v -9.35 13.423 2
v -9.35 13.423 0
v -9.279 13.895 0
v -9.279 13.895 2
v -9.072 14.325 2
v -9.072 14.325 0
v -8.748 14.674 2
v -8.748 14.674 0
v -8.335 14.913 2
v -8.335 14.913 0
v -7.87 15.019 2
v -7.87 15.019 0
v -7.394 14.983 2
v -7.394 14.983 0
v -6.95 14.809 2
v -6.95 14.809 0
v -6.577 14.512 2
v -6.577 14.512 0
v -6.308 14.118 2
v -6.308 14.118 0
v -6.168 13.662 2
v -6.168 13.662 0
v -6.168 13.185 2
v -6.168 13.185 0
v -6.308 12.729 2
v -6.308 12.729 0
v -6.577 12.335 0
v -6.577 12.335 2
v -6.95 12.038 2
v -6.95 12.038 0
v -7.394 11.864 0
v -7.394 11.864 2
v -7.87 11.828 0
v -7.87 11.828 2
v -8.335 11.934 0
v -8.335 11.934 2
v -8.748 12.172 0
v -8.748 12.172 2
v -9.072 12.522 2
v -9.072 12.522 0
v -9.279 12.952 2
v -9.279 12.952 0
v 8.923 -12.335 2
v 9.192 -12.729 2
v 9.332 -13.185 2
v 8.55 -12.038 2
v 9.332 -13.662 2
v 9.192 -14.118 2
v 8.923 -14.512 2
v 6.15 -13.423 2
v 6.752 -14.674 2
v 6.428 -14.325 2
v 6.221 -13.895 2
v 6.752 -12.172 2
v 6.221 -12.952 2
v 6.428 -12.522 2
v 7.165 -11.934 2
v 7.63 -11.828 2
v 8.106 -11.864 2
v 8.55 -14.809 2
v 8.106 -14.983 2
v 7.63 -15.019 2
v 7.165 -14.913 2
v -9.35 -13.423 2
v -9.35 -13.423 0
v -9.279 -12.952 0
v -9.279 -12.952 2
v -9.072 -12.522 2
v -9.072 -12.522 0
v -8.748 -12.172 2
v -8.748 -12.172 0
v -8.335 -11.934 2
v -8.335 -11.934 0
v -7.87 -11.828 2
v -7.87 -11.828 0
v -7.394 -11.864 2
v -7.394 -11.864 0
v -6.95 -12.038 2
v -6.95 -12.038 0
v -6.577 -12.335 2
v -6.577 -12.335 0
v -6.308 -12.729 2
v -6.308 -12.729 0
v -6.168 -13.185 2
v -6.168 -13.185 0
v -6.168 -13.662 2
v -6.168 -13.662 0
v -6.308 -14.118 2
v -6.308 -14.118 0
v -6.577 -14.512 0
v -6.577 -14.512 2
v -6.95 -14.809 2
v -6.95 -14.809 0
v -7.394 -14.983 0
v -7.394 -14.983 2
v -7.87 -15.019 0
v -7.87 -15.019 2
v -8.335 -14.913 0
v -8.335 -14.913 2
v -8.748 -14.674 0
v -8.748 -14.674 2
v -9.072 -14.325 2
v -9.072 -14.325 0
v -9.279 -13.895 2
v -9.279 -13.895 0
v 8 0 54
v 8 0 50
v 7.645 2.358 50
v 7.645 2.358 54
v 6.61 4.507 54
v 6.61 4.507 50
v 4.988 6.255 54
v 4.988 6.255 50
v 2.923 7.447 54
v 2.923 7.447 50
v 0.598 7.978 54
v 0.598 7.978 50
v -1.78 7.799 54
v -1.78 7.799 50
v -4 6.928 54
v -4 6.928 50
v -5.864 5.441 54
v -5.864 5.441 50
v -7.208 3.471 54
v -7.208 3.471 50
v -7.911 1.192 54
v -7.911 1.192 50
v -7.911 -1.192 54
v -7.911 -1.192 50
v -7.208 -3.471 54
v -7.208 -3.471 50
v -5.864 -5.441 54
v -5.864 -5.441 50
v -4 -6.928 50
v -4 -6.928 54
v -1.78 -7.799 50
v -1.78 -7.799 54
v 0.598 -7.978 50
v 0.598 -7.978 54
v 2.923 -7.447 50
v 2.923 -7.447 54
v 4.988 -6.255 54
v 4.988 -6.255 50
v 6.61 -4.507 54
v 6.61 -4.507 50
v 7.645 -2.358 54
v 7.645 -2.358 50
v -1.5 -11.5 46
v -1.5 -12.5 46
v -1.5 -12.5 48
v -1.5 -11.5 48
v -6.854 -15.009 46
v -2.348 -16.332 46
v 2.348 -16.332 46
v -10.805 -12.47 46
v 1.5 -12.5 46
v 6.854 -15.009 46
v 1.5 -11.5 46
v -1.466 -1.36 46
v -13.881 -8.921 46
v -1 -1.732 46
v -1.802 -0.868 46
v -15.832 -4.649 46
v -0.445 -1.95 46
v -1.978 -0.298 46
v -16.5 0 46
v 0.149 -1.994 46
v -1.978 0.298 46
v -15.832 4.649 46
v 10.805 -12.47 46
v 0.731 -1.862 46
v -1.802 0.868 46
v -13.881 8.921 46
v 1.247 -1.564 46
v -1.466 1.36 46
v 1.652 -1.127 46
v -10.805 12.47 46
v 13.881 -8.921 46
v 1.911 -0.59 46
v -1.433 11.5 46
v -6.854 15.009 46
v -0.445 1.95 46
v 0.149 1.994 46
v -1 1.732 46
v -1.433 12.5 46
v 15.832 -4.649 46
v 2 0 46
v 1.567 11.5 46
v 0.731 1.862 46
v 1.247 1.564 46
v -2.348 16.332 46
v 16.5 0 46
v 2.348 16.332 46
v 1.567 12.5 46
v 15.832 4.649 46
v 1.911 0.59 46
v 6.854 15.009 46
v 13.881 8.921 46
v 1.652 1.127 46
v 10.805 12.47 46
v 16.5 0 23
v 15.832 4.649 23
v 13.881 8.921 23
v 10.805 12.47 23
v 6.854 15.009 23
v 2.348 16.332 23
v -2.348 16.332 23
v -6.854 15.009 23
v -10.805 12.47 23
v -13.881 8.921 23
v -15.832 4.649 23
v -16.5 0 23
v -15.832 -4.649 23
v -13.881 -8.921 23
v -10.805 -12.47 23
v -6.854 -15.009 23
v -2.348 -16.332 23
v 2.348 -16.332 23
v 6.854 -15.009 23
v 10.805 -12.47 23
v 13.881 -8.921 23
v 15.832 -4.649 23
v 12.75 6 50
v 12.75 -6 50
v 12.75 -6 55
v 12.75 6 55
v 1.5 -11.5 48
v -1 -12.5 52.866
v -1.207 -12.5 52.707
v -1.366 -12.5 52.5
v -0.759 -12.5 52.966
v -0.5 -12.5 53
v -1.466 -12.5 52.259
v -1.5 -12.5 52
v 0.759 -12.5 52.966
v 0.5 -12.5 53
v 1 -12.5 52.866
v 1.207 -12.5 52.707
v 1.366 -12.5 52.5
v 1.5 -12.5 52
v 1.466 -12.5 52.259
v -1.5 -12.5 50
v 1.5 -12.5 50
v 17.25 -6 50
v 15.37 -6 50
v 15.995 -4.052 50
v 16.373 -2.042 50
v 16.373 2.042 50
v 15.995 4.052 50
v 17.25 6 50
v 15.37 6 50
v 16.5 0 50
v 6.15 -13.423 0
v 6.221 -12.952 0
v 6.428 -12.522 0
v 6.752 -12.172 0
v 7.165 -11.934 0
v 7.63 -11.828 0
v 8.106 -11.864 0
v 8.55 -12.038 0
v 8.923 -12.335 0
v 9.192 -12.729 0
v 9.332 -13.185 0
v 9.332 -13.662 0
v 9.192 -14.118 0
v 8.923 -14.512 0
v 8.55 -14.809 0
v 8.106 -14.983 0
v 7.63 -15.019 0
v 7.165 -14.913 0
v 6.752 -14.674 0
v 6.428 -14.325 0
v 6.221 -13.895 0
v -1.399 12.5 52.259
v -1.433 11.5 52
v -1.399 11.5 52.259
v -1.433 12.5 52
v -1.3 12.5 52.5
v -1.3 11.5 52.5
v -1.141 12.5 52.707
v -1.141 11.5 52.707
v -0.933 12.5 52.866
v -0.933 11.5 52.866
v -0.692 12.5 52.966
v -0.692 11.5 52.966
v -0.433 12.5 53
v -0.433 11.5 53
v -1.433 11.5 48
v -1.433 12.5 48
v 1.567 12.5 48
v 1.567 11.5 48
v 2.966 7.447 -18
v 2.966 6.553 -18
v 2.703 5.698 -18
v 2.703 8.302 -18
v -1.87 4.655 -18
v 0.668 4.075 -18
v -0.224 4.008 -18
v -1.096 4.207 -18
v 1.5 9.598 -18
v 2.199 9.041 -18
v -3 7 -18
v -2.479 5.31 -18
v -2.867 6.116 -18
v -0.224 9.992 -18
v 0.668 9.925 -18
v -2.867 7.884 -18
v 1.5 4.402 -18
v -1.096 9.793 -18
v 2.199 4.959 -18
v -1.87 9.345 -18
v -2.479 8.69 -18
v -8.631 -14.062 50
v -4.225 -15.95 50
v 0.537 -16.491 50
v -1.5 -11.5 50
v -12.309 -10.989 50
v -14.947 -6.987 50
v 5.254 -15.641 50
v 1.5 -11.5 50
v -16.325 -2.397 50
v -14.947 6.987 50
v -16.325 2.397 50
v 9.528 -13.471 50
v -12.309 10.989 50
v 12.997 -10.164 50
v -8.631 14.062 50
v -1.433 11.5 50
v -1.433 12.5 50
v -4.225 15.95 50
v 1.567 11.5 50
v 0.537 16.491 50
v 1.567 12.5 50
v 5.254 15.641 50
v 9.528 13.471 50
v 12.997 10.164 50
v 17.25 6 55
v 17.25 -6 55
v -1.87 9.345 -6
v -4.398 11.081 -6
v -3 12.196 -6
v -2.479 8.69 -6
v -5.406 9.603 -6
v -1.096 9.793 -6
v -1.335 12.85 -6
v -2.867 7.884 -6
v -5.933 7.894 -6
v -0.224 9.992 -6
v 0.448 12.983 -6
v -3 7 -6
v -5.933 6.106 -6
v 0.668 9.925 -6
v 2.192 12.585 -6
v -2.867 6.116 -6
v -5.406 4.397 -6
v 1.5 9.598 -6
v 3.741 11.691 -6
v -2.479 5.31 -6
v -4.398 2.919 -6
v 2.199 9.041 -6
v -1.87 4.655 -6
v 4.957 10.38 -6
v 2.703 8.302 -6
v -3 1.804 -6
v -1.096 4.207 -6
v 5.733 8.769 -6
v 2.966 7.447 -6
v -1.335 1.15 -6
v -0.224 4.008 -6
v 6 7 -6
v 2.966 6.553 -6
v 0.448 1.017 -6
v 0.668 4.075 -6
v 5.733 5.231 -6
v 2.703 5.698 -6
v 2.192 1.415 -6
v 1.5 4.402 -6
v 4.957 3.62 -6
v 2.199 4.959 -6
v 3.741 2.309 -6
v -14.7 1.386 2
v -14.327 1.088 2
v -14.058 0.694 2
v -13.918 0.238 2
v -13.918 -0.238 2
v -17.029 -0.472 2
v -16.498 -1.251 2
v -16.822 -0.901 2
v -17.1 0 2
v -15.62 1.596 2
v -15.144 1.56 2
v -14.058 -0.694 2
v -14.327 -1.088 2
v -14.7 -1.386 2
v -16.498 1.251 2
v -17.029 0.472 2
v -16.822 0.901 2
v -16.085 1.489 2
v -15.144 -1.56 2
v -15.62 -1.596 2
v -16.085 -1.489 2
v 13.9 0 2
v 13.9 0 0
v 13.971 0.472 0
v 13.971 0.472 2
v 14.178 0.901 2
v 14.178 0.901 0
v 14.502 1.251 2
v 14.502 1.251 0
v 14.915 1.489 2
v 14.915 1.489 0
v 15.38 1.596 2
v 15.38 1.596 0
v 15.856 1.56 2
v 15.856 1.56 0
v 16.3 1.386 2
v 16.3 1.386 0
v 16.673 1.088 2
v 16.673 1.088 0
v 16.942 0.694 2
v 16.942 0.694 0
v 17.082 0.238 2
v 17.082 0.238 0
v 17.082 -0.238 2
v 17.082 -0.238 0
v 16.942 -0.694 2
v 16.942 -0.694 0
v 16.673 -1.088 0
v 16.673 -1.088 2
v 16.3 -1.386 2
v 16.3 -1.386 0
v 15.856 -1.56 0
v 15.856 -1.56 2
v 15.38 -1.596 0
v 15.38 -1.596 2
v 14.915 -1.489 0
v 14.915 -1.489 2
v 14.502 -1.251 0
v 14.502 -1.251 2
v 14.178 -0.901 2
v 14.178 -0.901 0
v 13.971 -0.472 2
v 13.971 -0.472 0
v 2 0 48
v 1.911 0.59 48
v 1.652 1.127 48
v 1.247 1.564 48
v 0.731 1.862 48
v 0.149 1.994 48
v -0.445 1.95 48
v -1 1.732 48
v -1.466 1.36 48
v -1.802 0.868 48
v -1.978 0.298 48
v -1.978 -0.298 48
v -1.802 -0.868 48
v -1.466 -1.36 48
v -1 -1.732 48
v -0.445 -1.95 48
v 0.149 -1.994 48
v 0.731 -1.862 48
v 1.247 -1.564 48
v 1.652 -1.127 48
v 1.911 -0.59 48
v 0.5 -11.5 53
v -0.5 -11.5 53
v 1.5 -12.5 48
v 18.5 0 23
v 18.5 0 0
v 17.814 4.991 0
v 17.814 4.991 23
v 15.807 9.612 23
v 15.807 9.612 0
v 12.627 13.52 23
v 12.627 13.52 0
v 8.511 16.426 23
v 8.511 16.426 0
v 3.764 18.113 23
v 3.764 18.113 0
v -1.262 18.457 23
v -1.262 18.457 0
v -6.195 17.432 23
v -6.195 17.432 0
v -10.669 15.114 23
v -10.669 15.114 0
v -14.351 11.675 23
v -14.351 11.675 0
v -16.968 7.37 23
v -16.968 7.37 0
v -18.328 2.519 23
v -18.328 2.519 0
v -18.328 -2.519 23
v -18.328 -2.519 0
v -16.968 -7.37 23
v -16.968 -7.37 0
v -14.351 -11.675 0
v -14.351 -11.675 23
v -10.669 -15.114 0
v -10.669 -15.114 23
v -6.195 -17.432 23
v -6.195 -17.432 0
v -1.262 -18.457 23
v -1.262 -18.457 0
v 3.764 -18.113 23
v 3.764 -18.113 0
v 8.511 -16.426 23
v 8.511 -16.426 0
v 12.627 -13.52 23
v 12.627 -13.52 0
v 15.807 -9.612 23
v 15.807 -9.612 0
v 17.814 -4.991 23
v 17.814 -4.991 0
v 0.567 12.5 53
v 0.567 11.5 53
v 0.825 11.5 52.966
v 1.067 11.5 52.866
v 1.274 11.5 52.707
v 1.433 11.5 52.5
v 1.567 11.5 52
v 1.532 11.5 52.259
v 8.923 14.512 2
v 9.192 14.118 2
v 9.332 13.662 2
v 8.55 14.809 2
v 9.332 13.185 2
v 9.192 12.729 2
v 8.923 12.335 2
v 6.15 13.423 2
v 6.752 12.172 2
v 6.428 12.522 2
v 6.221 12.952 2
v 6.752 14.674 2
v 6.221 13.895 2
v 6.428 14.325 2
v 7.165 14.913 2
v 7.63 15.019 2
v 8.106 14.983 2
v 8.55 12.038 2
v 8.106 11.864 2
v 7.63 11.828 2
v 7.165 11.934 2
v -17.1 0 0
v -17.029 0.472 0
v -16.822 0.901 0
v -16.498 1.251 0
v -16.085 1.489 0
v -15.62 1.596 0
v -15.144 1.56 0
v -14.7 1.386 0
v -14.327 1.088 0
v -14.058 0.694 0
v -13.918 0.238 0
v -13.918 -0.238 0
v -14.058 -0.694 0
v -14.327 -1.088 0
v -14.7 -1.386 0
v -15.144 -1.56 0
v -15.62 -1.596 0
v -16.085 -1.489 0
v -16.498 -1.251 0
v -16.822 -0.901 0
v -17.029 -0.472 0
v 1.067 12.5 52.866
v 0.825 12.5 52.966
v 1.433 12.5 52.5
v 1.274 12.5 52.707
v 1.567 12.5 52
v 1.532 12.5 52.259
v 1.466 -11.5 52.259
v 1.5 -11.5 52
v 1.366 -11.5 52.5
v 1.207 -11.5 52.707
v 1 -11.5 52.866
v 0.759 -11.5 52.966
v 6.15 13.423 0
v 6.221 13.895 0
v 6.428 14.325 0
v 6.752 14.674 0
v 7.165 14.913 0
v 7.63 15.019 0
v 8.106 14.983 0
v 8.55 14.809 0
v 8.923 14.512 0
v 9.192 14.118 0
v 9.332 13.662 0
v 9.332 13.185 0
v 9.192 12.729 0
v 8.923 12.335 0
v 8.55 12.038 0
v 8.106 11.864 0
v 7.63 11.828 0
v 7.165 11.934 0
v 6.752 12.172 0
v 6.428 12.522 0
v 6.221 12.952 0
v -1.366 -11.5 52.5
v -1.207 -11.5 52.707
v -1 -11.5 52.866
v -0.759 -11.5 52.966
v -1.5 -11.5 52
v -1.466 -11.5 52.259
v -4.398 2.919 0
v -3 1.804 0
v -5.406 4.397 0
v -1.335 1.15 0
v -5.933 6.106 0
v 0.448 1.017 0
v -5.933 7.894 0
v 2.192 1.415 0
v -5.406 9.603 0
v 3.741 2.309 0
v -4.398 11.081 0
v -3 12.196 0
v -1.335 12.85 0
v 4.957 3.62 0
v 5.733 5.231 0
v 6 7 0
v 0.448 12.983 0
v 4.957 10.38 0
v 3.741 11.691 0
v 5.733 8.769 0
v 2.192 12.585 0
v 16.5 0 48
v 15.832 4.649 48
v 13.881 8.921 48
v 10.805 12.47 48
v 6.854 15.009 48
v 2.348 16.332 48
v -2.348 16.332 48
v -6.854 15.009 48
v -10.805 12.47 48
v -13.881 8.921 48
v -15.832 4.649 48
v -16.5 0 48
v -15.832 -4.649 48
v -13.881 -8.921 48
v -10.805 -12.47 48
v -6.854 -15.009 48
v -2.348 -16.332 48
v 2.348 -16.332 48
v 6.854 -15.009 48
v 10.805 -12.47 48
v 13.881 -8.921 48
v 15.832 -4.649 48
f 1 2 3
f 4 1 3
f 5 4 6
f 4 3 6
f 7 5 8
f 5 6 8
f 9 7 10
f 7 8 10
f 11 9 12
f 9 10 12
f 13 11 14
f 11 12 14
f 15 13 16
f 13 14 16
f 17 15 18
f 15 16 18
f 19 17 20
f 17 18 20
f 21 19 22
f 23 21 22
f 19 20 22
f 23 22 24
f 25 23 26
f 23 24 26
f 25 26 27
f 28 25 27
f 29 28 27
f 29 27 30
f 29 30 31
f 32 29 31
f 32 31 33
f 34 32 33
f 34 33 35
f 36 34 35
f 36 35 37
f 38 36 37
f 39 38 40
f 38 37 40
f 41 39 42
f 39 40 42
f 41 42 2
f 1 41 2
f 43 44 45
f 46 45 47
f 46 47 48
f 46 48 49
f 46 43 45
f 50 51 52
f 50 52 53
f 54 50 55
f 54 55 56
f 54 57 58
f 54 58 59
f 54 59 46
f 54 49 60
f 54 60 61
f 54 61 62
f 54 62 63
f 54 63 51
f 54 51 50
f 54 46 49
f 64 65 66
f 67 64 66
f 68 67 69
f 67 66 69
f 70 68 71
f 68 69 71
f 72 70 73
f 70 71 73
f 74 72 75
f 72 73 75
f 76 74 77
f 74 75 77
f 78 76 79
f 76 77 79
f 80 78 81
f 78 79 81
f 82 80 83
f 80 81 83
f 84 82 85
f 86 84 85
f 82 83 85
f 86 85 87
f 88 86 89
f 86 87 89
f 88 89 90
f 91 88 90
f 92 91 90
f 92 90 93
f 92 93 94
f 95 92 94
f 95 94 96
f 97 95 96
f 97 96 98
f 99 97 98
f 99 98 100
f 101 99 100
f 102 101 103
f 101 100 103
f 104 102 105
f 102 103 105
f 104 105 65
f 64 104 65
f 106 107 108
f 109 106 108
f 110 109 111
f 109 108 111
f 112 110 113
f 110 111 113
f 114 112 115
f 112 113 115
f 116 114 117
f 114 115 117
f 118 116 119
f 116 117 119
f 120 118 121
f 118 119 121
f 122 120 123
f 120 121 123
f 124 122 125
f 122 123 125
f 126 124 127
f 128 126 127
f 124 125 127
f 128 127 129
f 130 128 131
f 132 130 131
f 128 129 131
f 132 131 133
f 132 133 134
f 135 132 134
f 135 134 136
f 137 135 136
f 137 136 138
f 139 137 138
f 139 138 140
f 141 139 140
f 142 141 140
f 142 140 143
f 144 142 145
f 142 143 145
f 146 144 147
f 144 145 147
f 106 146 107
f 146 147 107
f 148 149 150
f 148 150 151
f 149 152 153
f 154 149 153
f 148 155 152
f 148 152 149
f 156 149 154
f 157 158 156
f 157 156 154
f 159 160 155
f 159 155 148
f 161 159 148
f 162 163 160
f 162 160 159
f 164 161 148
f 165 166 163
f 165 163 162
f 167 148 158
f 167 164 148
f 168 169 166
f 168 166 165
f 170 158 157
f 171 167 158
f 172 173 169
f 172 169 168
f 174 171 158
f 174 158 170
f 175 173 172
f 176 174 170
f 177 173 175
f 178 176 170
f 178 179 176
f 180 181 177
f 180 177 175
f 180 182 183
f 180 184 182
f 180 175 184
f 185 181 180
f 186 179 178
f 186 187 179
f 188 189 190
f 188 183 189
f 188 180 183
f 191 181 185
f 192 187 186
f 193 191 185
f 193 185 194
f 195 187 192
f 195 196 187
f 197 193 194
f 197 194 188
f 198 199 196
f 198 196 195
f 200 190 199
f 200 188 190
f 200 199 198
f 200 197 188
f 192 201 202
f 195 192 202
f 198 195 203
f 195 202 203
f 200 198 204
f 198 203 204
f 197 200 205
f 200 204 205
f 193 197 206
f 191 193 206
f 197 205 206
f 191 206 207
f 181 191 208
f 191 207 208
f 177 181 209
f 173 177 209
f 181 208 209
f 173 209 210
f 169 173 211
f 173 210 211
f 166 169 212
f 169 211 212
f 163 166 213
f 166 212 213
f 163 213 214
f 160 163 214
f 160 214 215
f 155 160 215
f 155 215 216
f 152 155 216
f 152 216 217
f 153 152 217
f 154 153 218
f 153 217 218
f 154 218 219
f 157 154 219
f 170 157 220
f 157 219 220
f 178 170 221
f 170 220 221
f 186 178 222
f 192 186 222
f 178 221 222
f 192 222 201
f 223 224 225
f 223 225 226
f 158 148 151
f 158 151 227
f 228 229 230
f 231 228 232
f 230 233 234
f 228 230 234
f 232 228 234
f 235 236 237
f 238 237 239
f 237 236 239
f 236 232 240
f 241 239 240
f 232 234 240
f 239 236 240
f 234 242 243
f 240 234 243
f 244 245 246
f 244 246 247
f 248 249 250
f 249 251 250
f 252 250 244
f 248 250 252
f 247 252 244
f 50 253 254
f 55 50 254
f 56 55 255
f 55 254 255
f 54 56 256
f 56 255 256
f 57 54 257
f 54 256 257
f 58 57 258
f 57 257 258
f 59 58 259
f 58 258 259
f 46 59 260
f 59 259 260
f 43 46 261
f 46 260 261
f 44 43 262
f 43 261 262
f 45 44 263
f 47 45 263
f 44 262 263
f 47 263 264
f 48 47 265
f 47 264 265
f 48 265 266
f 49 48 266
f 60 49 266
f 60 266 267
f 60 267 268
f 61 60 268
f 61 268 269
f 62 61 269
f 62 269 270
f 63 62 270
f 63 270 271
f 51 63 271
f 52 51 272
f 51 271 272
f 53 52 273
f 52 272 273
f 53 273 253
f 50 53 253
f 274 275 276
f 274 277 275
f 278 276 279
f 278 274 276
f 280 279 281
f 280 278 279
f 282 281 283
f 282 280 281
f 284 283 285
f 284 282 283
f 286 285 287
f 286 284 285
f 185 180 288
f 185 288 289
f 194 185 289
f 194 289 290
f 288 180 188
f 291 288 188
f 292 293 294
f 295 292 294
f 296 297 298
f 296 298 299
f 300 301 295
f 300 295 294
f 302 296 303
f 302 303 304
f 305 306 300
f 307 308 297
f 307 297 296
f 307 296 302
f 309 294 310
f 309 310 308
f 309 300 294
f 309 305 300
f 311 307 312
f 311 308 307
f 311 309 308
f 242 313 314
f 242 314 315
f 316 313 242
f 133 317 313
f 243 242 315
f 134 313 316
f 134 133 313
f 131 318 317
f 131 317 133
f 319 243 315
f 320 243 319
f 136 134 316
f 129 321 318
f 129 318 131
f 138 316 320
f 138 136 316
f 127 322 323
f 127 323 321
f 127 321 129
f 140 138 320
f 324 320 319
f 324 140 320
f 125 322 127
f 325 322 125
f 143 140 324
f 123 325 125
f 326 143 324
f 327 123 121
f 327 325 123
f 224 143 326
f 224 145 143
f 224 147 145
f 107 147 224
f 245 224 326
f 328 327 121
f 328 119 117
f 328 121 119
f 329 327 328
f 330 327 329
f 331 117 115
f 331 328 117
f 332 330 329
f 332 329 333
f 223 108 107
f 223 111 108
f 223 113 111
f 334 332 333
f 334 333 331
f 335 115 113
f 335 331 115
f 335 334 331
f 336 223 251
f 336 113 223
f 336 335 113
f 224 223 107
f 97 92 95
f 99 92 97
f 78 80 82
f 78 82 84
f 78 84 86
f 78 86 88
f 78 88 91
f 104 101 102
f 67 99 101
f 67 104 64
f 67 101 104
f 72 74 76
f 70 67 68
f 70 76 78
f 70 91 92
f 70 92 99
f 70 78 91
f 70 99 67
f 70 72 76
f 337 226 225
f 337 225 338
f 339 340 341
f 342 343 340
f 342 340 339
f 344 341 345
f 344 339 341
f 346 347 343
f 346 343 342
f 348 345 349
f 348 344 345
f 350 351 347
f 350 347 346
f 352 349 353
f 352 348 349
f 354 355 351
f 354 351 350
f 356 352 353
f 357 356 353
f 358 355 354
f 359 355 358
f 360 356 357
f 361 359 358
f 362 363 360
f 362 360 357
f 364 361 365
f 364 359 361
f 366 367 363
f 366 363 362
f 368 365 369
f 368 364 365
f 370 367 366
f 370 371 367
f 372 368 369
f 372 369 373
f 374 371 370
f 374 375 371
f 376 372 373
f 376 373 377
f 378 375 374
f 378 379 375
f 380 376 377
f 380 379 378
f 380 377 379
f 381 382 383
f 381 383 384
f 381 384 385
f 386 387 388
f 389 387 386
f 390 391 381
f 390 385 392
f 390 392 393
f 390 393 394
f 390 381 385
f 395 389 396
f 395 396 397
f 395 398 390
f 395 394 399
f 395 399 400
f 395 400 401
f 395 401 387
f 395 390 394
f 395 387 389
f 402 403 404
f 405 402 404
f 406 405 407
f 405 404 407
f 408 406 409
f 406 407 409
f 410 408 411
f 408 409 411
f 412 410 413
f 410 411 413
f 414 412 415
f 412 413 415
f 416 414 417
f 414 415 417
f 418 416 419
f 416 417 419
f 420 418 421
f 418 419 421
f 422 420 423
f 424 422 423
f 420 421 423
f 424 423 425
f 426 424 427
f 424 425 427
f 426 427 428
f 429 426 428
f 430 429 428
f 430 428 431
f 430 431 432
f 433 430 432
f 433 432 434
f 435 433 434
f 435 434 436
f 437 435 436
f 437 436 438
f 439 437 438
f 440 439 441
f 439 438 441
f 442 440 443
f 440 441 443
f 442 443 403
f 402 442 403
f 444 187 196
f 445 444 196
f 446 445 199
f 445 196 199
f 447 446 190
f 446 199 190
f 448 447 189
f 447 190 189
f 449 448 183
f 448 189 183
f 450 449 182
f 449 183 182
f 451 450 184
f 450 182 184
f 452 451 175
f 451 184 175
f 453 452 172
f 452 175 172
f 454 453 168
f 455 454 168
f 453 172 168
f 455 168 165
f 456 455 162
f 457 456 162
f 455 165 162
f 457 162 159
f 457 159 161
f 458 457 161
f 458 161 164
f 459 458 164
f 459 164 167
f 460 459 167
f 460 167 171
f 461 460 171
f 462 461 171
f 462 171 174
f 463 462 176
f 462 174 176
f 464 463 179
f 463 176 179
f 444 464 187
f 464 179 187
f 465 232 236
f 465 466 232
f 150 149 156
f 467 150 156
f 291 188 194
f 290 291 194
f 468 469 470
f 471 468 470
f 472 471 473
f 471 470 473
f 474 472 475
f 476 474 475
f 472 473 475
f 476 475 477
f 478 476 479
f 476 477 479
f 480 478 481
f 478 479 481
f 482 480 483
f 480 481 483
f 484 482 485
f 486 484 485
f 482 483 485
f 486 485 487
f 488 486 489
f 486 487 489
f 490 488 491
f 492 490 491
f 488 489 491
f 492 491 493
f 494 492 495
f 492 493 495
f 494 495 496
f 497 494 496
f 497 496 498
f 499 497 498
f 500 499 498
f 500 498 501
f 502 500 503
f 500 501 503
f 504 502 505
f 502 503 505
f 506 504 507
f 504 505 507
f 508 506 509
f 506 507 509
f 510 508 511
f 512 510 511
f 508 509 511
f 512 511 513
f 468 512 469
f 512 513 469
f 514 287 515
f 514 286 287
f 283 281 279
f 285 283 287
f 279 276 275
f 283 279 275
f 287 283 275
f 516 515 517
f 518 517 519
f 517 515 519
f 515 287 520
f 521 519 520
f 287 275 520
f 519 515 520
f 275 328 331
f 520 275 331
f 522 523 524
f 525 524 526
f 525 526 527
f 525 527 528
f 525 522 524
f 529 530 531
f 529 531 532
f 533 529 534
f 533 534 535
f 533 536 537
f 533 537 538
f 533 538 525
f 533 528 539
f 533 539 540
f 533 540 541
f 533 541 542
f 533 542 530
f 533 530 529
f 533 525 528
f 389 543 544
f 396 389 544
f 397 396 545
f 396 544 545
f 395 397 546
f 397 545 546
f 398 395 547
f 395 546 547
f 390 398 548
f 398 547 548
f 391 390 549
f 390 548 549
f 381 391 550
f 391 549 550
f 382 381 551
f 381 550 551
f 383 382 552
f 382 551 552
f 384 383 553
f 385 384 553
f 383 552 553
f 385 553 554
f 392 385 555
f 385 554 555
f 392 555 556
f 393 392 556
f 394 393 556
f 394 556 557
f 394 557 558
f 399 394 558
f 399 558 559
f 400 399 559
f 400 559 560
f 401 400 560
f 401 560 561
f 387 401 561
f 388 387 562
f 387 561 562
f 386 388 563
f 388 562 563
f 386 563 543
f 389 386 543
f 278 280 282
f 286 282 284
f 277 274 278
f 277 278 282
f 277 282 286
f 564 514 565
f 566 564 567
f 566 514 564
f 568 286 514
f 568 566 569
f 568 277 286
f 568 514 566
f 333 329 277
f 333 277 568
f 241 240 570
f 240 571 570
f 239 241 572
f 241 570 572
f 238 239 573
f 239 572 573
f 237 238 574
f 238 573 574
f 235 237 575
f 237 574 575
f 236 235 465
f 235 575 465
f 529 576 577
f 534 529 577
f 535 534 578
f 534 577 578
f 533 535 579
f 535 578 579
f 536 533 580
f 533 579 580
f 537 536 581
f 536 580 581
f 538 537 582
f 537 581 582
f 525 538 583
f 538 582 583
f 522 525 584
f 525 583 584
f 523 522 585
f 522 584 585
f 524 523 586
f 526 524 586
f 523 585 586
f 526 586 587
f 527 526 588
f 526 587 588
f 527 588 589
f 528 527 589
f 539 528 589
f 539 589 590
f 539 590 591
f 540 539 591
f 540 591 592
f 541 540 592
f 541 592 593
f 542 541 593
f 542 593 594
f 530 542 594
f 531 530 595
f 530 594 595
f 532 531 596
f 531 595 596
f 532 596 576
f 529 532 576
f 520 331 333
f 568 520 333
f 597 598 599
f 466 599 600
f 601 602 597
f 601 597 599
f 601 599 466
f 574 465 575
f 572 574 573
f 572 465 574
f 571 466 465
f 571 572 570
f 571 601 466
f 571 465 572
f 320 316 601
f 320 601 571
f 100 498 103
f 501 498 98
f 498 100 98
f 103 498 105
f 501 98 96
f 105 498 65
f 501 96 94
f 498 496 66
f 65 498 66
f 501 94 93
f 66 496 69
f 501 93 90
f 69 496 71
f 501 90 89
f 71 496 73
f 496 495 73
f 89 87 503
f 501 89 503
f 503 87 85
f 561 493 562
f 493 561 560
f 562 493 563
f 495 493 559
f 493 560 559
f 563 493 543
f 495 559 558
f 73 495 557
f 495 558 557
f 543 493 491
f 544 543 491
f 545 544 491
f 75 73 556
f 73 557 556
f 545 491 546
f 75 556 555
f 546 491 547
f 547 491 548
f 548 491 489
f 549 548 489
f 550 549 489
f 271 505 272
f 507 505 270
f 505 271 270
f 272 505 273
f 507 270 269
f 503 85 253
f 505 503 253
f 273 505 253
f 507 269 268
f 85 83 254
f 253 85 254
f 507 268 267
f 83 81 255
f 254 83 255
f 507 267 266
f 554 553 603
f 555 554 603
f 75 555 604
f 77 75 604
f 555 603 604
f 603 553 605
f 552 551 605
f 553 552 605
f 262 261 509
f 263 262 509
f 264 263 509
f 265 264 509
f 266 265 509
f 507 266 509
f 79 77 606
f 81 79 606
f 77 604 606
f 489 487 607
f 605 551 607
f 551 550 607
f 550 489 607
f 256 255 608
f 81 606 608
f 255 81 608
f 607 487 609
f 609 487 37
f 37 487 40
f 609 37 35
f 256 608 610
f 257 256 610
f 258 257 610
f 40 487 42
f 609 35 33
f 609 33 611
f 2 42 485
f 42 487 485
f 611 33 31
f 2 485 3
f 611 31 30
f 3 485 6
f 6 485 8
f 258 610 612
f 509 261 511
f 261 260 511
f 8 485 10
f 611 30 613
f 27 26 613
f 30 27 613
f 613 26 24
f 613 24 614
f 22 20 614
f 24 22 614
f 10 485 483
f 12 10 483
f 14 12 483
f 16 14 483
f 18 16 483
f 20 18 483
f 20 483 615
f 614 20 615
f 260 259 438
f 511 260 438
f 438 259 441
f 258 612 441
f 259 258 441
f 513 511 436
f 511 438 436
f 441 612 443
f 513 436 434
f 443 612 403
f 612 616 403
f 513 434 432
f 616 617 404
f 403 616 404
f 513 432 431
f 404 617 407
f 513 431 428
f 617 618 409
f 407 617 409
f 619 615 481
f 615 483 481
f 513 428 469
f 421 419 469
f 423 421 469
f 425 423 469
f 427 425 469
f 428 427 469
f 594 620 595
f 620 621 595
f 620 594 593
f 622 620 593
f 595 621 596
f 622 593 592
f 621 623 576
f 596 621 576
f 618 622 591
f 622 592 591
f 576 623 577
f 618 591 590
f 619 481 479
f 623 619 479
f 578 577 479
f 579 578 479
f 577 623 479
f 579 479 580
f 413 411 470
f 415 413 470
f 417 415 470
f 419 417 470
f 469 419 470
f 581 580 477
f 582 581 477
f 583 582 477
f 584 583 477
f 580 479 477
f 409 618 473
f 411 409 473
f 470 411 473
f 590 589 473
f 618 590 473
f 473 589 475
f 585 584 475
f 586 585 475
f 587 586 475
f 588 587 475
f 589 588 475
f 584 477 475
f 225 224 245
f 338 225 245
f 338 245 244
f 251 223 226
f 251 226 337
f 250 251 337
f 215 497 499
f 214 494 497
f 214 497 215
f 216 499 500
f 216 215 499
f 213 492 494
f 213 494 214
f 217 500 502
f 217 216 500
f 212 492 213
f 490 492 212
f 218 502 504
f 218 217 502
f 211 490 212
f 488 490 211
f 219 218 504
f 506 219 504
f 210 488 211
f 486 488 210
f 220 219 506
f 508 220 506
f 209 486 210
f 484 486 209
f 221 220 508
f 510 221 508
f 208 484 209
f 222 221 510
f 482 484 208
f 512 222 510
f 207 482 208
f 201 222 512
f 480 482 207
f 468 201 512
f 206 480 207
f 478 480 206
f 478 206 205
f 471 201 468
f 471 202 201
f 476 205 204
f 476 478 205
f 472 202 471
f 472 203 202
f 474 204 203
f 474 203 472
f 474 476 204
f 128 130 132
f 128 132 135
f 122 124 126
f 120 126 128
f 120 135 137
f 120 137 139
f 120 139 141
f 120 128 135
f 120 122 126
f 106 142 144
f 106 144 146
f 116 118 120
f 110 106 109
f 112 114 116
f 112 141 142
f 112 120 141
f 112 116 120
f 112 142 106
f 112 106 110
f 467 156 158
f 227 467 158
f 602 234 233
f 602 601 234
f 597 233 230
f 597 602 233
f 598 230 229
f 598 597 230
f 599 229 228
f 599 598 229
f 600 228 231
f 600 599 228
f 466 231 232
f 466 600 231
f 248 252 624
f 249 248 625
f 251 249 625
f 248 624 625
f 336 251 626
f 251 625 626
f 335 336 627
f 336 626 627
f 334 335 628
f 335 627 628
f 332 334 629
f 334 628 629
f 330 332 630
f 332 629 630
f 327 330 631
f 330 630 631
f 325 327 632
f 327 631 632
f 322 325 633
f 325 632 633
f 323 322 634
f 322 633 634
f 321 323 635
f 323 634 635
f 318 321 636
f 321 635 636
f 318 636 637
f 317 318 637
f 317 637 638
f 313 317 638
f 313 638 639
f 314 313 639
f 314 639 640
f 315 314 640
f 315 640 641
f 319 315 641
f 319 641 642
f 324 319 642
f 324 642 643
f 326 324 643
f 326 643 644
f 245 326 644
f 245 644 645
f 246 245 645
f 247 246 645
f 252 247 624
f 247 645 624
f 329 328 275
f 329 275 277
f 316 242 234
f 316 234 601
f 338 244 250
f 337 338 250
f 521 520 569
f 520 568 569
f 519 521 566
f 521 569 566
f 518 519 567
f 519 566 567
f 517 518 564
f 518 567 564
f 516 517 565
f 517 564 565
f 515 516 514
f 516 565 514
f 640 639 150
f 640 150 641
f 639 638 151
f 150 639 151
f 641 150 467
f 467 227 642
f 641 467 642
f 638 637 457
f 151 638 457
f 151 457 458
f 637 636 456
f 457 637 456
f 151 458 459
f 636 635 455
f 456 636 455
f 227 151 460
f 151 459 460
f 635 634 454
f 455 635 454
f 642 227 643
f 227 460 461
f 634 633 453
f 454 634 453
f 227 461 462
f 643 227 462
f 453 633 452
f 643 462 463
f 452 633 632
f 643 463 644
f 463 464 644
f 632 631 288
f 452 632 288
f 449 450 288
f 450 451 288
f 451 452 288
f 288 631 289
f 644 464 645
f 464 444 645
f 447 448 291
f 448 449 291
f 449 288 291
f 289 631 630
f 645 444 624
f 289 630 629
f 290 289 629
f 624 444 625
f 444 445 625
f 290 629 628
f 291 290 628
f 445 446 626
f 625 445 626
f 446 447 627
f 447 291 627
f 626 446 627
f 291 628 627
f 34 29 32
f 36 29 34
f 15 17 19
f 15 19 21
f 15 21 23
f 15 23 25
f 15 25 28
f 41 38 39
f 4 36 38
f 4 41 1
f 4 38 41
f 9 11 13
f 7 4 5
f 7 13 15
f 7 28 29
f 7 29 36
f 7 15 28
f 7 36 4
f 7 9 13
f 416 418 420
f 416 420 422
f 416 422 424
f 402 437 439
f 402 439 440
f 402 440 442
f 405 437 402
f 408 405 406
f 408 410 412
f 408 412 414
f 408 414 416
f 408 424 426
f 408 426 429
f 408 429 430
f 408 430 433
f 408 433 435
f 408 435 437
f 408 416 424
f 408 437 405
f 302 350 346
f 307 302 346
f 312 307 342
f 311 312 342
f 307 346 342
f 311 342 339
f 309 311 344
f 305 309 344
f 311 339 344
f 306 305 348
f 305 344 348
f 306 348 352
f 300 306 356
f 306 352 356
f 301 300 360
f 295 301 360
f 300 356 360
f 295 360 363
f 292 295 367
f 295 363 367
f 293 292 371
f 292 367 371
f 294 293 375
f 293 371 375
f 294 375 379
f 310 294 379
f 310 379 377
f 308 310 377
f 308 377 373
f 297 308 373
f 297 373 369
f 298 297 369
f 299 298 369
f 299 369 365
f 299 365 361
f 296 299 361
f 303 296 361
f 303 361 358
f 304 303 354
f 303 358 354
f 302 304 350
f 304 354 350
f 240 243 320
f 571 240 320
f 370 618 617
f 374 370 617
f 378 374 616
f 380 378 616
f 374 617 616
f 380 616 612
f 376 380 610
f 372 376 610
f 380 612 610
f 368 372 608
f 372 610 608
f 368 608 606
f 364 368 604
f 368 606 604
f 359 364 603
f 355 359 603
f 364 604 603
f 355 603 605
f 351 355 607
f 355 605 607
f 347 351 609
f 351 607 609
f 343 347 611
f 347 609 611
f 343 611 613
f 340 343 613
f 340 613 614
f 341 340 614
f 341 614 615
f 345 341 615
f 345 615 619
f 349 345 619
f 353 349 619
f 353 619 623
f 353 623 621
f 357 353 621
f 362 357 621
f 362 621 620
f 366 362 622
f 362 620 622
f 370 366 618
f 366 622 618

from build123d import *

# Parameters (mm, degrees)
SKETCH_1_R          = 18.5
EXTRUDE_3_DEPTH     = 23
SKETCH_3_R          = 16.5
EXTRUDE_4_DEPTH     = 23
SKETCH_4_R          = 6
EXTRUDE_5_DEPTH     = 6
SKETCH_6_R          = 3
EXTRUDE_6_DEPTH     = 12
SKETCH_7_R          = 2
EXTRUDE_7_DEPTH     = 2
SKETCH_8_W          = 3
SKETCH_8_H          = 1
EXTRUDE_8_DEPTH     = 7
SKETCH_9_R          = 16.5
EXTRUDE_9_DEPTH     = 2
SKETCH_10_W         = 4.5
SKETCH_10_H         = 12
EXTRUDE_10_DEPTH    = 5
FILLET_1_R          = 1
SKETCH_11_R         = 8
EXTRUDE_11_DEPTH    = 4
SKETCH_12_R         = 1.6
CUT_EXTRUDE_1_DEPTH = 2


with BuildPart() as part:
    # 草图1 → 凸台-拉伸3 (new body)
    with BuildSketch(Plane.XY):
        Circle(SKETCH_1_R)
    extrude(amount=EXTRUDE_3_DEPTH)

    # 草图3 → 凸台-拉伸4 (add)
    with BuildSketch(Plane.XY.offset(23)):
        Circle(SKETCH_3_R)
    extrude(amount=EXTRUDE_4_DEPTH)

    # 草图4 → 凸台-拉伸5 (add)
    with BuildSketch(Plane(origin=(0, 0, 0), x_dir=(-1, 0, 0), z_dir=(0, 0, -1))):
        with Locations(Location((0, 7, 0), (0, 0, 180))):
            Circle(SKETCH_4_R)
    extrude(amount=EXTRUDE_5_DEPTH)

    # 草图6 → 凸台-拉伸6 (add)
    with BuildSketch(Plane(origin=(0, 0, -6), x_dir=(-1, 0, 0), z_dir=(0, 0, -1))):
        with Locations((0, 7)):
            Circle(SKETCH_6_R)
    extrude(amount=EXTRUDE_6_DEPTH)

    # 草图7 → 凸台-拉伸7 (add)
    with BuildSketch(Plane.XY.offset(46)):
        Circle(SKETCH_7_R)
    extrude(amount=EXTRUDE_7_DEPTH)

    # 草图8 → 凸台-拉伸8 (add)
    with BuildSketch(Plane.XY.offset(46)):
        with Locations((0, -12)):
            Rectangle(SKETCH_8_W, SKETCH_8_H)
        with Locations((0.066509227, 12)):
            Rectangle(SKETCH_8_W, SKETCH_8_H)
    extrude(amount=EXTRUDE_8_DEPTH)

    # 草图9 → 凸台-拉伸9 (add)
    with BuildSketch(Plane.XY.offset(48)):
        Circle(SKETCH_9_R)
    extrude(amount=EXTRUDE_9_DEPTH)

    # 草图10 → 凸台-拉伸10 (add)
    with BuildSketch(Plane.XY.offset(50)):
        with Locations((15, 0)):
            Rectangle(SKETCH_10_W, SKETCH_10_H)
    extrude(amount=EXTRUDE_10_DEPTH)

    # 圆角1
    fillet_1_edges = [part.edges().sort_by_distance(p)[0] for p in [
        (1.566509227, 12, 53),
        (-1.433490773, 12, 53),
        (1.5, -12, 53),
        (-1.5, -12, 53),
    ]]
    fillet(fillet_1_edges, radius=FILLET_1_R)

    # 草图11 → 凸台-拉伸11 (add)
    with BuildSketch(Plane.XY.offset(50)):
        Circle(SKETCH_11_R)
    extrude(amount=EXTRUDE_11_DEPTH)

    # 草图12 → 切除-拉伸1 (cut)
    with BuildSketch(Plane(origin=(0, 0, 0), x_dir=(-1, 0, 0), z_dir=(0, 0, -1))):
        with Locations((15.5, 0)):
            Circle(SKETCH_12_R)
        with Locations((7.75, -13.423393759)):
            Circle(SKETCH_12_R)
        with Locations((-7.75, -13.423393759)):
            Circle(SKETCH_12_R)
        with Locations((-15.5, 0)):
            Circle(SKETCH_12_R)
        with Locations((-7.75, 13.423393759)):
            Circle(SKETCH_12_R)
        with Locations((7.75, 13.423393759)):
            Circle(SKETCH_12_R)
    extrude(amount=-CUT_EXTRUDE_1_DEPTH, mode=Mode.SUBTRACT)


solid = part.part
